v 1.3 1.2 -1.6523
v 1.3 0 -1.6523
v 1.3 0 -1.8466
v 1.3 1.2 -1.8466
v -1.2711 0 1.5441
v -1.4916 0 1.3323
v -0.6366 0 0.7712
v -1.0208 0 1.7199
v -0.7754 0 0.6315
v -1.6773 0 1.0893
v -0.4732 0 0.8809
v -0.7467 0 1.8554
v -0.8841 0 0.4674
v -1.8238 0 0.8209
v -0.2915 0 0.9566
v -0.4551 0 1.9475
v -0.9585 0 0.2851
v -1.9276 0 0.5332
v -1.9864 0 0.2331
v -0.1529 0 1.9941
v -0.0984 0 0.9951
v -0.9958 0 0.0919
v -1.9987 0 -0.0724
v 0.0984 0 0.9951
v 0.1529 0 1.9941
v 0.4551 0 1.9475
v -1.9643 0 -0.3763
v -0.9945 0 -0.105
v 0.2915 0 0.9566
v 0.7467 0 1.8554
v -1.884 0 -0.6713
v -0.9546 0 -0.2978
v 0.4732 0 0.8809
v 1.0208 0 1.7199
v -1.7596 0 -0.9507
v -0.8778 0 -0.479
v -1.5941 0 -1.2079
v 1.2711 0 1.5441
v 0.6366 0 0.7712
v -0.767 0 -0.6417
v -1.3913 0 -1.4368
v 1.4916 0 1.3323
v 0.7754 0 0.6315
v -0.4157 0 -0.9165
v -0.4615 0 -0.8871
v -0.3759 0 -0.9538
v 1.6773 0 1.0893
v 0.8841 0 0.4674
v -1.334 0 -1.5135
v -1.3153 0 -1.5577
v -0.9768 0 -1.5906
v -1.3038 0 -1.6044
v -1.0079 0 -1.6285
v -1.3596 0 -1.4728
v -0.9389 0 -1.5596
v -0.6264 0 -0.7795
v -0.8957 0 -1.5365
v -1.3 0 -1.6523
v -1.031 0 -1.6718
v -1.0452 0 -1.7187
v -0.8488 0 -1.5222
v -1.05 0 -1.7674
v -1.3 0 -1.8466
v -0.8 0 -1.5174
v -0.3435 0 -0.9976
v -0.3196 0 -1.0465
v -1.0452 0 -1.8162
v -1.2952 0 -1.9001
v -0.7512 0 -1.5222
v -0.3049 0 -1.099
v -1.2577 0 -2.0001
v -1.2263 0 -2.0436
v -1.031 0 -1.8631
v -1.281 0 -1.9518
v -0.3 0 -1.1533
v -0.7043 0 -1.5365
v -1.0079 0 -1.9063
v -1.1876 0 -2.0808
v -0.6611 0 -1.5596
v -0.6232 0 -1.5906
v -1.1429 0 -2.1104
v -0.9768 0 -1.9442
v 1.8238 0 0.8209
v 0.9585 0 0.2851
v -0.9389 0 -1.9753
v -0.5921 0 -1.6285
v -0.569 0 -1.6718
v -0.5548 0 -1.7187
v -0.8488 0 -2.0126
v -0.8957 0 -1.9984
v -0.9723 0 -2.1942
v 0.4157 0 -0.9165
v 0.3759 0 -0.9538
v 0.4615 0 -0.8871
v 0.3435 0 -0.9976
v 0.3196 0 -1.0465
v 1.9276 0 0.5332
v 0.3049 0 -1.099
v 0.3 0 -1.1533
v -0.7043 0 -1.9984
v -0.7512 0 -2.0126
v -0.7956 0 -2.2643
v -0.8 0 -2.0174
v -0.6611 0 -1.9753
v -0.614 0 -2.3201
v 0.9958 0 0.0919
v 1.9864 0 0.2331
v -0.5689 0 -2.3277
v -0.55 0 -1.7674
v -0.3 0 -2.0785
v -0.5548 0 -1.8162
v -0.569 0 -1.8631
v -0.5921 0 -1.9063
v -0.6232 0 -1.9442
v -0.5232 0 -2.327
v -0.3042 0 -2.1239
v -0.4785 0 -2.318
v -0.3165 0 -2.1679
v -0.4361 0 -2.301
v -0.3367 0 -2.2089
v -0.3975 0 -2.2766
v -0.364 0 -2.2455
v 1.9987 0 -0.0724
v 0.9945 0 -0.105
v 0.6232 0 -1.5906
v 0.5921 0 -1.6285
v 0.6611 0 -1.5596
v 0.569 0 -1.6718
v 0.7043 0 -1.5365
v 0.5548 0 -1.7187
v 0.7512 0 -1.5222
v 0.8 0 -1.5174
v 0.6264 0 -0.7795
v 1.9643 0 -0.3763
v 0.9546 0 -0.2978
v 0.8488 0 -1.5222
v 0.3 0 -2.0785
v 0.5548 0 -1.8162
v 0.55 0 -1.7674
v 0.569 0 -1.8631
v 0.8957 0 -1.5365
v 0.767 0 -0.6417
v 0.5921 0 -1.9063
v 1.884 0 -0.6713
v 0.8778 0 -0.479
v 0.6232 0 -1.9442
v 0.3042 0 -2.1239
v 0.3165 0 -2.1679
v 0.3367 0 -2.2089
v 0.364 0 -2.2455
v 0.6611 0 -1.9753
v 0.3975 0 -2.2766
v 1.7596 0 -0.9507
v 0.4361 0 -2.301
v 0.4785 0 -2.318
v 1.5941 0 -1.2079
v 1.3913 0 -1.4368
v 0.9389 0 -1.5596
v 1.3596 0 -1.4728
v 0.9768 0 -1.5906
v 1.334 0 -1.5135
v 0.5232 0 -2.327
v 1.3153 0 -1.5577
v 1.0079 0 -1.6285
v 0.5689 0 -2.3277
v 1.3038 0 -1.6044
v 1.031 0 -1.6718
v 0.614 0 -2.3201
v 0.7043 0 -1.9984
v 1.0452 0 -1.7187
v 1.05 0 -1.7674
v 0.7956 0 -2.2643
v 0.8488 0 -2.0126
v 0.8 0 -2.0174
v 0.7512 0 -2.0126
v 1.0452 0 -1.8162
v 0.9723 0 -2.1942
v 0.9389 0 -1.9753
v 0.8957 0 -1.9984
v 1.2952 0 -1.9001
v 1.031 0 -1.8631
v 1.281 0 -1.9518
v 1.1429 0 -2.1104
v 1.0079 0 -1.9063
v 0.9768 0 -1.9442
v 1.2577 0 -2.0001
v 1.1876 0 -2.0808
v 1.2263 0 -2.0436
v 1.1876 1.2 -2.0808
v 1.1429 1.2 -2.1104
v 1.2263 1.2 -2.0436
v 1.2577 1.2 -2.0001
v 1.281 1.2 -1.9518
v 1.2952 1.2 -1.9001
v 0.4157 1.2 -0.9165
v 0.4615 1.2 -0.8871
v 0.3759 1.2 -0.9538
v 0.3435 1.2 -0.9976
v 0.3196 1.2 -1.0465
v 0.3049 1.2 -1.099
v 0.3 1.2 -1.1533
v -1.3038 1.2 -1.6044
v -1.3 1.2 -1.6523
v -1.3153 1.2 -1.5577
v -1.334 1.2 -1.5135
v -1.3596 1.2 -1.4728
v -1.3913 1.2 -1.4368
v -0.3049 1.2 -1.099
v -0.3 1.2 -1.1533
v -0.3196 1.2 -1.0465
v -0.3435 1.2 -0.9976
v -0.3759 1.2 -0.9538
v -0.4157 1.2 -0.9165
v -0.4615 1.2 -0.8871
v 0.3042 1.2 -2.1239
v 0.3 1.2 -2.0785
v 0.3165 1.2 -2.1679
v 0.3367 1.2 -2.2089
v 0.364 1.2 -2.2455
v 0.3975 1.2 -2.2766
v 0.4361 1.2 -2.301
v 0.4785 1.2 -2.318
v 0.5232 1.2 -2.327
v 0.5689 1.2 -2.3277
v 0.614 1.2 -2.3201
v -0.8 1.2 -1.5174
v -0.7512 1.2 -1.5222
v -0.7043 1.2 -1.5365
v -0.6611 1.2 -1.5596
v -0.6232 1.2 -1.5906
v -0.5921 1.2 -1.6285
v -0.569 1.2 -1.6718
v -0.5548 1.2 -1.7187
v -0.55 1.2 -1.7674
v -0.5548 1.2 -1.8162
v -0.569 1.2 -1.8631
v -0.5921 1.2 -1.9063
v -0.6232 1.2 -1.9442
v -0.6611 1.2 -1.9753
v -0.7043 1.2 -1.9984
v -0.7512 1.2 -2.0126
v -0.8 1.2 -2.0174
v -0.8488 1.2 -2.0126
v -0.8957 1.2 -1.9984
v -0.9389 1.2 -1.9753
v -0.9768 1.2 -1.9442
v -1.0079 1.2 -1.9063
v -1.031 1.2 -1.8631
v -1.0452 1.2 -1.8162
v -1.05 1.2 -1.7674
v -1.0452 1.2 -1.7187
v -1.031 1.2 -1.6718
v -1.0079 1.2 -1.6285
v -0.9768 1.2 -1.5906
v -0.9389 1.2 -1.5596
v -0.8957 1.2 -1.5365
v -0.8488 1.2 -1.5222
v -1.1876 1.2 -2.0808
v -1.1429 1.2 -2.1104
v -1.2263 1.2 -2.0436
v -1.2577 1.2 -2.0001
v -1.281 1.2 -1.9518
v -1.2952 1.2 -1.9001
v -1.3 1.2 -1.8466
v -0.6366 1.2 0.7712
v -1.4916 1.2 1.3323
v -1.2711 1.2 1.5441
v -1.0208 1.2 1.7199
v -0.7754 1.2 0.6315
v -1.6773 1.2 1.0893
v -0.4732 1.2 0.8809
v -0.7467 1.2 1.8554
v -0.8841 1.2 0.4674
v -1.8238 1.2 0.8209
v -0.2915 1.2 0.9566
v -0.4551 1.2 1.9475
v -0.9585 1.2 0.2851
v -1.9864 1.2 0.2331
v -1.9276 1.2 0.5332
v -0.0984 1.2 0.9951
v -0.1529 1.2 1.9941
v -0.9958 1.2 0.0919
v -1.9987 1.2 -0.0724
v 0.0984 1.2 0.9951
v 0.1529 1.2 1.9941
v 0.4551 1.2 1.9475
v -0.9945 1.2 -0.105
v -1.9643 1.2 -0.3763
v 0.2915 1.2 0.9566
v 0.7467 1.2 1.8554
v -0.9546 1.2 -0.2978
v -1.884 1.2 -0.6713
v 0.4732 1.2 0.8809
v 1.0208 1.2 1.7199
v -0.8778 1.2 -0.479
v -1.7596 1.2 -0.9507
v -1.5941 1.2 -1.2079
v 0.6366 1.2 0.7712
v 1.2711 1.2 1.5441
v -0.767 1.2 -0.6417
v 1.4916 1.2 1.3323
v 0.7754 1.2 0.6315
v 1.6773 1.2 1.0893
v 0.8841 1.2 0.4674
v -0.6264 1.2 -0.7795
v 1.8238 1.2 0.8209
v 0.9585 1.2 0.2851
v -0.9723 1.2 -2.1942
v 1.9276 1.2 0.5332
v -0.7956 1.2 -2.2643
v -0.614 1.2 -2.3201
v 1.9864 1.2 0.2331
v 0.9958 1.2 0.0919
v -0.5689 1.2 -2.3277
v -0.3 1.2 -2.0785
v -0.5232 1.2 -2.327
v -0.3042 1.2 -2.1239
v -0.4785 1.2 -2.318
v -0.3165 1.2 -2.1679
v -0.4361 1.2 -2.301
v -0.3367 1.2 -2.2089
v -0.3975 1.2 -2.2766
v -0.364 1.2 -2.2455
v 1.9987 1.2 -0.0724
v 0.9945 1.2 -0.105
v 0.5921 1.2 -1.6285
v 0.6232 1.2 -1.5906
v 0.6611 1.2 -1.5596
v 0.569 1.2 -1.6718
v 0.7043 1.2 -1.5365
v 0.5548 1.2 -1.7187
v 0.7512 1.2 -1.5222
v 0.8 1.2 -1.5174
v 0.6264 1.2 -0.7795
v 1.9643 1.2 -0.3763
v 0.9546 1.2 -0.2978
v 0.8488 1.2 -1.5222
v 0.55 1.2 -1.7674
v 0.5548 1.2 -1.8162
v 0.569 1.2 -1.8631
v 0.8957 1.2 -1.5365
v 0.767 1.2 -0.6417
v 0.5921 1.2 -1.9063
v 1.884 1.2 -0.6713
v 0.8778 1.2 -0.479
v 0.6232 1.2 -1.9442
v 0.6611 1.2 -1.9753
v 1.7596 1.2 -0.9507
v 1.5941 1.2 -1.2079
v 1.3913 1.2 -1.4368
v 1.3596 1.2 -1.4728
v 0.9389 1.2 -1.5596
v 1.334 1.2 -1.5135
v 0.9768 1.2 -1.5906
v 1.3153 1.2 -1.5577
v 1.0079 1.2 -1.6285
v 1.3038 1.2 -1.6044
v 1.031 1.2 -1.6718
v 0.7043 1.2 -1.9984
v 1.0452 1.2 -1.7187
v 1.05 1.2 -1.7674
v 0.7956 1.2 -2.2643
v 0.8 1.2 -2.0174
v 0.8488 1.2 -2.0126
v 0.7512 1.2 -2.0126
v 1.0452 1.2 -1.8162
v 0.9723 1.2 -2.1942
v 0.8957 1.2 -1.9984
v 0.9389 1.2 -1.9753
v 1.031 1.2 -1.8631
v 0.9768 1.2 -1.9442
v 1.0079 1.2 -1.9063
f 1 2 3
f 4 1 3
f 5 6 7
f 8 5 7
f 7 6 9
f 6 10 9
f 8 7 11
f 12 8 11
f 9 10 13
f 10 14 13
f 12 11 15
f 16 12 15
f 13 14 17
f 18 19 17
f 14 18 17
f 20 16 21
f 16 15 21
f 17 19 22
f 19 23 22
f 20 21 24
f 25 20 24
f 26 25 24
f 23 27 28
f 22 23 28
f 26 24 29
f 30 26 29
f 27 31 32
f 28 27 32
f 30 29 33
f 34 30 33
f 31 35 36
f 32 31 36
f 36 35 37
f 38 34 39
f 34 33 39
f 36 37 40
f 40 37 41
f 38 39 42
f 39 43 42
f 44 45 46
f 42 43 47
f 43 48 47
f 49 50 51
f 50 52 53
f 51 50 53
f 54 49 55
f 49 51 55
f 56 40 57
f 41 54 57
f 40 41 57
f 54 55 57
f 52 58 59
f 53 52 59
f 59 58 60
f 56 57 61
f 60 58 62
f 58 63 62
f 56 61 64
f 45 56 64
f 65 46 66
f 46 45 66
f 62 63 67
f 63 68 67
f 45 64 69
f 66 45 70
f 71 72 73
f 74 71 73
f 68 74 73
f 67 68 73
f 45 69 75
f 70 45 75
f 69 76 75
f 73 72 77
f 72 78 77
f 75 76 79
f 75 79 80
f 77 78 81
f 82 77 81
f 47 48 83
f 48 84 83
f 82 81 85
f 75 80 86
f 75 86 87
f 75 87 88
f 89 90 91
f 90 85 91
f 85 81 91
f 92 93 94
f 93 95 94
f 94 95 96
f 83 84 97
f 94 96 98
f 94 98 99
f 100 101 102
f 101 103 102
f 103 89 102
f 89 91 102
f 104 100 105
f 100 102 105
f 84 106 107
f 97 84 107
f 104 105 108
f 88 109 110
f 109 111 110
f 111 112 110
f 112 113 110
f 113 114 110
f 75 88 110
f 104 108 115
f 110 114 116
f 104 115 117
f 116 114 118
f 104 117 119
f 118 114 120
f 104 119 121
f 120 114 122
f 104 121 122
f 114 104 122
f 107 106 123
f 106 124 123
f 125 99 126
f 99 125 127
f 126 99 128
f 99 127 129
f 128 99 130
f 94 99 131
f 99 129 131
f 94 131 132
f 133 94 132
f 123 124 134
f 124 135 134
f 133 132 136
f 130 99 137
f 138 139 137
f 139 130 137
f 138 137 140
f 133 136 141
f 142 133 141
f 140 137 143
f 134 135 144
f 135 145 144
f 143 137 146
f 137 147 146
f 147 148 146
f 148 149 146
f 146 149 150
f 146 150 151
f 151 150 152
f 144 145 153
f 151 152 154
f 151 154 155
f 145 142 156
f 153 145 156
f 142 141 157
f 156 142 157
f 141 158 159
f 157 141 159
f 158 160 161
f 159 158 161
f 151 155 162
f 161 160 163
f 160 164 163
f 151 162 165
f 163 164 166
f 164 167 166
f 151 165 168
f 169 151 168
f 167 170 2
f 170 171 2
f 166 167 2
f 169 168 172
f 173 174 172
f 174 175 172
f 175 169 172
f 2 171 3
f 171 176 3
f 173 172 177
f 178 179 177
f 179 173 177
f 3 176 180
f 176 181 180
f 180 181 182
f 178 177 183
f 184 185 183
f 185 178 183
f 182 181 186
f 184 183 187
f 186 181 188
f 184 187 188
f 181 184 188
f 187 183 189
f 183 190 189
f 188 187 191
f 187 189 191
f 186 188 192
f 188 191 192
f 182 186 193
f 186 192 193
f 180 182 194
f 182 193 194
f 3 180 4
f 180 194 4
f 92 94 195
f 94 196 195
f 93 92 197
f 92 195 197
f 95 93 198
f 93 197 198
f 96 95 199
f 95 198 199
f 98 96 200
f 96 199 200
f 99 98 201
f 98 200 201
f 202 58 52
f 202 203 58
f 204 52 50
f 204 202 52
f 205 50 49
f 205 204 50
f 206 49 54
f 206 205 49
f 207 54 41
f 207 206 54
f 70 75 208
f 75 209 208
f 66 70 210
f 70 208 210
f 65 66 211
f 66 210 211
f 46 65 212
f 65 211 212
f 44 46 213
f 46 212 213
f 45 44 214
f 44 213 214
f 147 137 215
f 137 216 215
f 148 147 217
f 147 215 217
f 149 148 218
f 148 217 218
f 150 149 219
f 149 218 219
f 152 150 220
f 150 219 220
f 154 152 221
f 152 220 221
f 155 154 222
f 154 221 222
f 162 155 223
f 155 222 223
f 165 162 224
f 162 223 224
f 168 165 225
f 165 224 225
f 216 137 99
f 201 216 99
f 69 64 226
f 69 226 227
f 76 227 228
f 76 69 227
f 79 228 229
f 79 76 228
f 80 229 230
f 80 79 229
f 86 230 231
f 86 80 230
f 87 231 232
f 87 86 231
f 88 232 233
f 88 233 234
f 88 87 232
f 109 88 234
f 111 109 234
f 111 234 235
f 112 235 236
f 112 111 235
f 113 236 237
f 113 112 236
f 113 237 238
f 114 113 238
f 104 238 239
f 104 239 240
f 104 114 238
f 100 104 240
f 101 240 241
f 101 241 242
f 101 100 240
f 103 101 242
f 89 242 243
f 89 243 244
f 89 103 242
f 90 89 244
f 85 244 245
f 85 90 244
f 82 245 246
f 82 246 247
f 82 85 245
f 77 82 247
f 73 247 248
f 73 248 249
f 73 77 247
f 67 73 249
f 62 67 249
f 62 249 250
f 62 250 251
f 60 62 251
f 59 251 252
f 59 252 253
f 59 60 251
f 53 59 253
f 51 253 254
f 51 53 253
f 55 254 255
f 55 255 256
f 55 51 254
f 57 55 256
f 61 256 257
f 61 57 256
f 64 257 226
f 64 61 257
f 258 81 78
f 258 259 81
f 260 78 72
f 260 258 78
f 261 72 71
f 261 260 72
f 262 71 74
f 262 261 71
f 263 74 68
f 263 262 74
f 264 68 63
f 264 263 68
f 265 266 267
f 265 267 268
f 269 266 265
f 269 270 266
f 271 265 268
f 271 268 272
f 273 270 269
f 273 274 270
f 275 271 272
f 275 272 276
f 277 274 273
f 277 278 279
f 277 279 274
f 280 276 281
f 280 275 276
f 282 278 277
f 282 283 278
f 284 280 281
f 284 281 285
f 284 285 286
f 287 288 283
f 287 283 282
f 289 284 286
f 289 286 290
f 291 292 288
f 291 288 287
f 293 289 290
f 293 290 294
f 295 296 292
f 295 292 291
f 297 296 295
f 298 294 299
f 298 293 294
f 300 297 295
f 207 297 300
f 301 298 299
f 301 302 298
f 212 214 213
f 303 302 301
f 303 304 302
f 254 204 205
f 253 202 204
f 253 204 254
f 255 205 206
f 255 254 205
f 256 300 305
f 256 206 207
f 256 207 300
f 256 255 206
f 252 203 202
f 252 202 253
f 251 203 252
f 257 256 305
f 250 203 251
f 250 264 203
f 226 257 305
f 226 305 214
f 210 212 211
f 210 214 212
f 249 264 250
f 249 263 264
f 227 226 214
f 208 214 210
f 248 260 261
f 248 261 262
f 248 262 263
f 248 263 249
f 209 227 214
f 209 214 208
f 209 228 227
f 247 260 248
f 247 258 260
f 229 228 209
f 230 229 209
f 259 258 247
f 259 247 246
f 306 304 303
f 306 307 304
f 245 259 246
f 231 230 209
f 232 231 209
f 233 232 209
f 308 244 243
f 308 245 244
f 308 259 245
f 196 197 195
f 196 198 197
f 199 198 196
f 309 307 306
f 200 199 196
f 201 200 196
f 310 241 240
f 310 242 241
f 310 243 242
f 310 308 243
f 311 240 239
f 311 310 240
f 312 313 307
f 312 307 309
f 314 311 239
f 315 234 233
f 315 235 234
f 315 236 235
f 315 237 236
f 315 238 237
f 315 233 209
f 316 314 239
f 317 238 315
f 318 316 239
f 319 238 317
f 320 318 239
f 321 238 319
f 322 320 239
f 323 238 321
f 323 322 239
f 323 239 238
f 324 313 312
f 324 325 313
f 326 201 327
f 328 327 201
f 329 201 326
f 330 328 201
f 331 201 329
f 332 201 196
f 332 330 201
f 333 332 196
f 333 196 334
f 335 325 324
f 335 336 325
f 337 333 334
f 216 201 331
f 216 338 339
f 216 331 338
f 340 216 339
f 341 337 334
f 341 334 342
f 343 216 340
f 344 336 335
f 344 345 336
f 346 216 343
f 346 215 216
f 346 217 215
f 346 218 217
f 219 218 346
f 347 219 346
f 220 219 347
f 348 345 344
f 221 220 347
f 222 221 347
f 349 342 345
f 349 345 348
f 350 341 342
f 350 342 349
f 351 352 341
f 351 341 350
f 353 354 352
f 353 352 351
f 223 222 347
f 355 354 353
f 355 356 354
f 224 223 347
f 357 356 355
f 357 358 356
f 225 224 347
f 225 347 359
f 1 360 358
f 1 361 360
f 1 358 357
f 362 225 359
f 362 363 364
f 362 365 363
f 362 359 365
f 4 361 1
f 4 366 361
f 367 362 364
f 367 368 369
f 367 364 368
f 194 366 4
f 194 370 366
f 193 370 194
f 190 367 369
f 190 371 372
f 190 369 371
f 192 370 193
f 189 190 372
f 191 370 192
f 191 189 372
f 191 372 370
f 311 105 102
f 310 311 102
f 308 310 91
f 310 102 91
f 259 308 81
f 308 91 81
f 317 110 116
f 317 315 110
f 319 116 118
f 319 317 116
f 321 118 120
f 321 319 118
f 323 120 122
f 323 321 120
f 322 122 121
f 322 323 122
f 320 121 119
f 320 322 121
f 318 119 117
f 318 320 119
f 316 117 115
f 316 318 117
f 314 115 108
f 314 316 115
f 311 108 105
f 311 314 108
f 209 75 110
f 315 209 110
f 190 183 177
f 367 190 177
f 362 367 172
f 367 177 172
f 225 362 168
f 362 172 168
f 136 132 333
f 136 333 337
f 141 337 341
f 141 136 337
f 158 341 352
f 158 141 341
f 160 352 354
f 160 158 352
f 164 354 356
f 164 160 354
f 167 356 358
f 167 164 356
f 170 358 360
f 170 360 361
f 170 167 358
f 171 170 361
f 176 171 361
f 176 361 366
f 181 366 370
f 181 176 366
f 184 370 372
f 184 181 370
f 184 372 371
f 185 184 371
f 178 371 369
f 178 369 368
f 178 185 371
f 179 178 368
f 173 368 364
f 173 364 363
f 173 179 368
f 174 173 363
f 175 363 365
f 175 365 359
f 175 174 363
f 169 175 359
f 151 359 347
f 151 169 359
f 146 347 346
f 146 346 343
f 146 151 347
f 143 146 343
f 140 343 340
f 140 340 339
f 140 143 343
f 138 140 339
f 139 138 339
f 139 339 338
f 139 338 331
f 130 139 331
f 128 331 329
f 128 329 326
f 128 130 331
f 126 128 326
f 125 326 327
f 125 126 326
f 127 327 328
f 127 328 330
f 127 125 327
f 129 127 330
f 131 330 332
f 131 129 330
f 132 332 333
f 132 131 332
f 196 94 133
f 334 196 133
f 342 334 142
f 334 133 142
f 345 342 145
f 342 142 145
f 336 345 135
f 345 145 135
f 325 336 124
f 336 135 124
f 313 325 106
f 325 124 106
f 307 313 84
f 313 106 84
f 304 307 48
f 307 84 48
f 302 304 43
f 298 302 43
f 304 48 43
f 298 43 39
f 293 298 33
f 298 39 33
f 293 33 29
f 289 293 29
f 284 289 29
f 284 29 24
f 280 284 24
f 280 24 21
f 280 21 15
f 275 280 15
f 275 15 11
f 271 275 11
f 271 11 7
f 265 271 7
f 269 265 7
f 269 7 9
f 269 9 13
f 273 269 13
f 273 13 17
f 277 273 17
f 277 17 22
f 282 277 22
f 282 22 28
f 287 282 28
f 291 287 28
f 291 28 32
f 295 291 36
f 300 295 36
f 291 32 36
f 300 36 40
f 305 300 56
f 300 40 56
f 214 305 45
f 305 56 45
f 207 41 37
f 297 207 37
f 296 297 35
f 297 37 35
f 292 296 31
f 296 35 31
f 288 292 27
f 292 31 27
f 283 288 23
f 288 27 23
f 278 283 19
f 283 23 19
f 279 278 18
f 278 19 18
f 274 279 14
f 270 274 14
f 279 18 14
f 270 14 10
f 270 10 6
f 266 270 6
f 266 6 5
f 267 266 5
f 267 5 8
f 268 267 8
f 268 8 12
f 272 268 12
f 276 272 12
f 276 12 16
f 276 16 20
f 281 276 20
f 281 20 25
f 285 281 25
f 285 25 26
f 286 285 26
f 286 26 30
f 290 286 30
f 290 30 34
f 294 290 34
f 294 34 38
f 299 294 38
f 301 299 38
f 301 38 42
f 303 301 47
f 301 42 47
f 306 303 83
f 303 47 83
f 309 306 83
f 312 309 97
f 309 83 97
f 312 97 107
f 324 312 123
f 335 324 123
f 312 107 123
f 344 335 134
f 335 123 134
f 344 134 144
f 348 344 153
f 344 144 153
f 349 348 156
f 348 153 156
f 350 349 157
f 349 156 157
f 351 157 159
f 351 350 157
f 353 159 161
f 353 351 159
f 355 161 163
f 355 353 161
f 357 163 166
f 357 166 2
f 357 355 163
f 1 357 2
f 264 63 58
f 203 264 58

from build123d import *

# Parameters (mm, degrees)
SKETCH1_R           = 0.25
BOSS_EXTRUDE1_DEPTH = 1.2
FILLET1_R           = 0.3
FILLET2_R           = 0.25


with BuildPart() as part:
    # Sketch1 → Boss-Extrude1 (new body)
    with BuildSketch(Plane(origin=(0, 0, 0), x_dir=(1, 0, 0), z_dir=(0, 1, 0))):
        with BuildLine():
            Line((-0.3, 0.953939201), (-0.3, 2.38117618))
            ThreePointArc((-0.3, 2.38117618), (-0.820413855, 2.255420383), (-1.3, 2.0174241))
            Line((-1.3, 2.0174241), (-1.3, 1.519868415))
            ThreePointArc((-1.3, 1.519868415), (0, -2), (1.3, 1.519868415))
            Line((1.3, 1.519868415), (1.3, 2.0174241))
            ThreePointArc((1.3, 2.0174241), (0.820413855, 2.255420383), (0.3, 2.38117618))
            Line((0.3, 2.38117618), (0.3, 0.953939201))
            ThreePointArc((0.3, 0.953939201), (0, -1), (-0.3, 0.953939201))
        make_face()
        with Locations(Location((-0.8, 1.7674241, 0), (0, 0, 270))):
            Circle(SKETCH1_R, mode=Mode.SUBTRACT)
        with Locations(Location((0.8, 1.7674241, 0), (0, 0, 270))):
            Circle(SKETCH1_R, mode=Mode.SUBTRACT)
    extrude(amount=BOSS_EXTRUDE1_DEPTH)

    # Fillet1
    fillet1_edges = [part.edges().sort_by_distance(p)[0] for p in [
        (0.3, 0.6, -0.953939201),
        (1.3, 0.6, -2.0174241),
        (1.3, 0.6, -1.519868415),
        (-1.3, 0.6, -1.519868415),
        (-1.3, 0.6, -2.0174241),
        (-0.3, 0.6, -0.953939201),
    ]]
    fillet(fillet1_edges, radius=FILLET1_R)

    # Fillet2
    fillet2_edges = [part.edges().sort_by_distance(p)[0] for p in [
        (0.3, 0.6, -2.38117618),
        (-0.3, 0.6, -2.38117618),
    ]]
    fillet(fillet2_edges, radius=FILLET2_R)


solid = part.part
